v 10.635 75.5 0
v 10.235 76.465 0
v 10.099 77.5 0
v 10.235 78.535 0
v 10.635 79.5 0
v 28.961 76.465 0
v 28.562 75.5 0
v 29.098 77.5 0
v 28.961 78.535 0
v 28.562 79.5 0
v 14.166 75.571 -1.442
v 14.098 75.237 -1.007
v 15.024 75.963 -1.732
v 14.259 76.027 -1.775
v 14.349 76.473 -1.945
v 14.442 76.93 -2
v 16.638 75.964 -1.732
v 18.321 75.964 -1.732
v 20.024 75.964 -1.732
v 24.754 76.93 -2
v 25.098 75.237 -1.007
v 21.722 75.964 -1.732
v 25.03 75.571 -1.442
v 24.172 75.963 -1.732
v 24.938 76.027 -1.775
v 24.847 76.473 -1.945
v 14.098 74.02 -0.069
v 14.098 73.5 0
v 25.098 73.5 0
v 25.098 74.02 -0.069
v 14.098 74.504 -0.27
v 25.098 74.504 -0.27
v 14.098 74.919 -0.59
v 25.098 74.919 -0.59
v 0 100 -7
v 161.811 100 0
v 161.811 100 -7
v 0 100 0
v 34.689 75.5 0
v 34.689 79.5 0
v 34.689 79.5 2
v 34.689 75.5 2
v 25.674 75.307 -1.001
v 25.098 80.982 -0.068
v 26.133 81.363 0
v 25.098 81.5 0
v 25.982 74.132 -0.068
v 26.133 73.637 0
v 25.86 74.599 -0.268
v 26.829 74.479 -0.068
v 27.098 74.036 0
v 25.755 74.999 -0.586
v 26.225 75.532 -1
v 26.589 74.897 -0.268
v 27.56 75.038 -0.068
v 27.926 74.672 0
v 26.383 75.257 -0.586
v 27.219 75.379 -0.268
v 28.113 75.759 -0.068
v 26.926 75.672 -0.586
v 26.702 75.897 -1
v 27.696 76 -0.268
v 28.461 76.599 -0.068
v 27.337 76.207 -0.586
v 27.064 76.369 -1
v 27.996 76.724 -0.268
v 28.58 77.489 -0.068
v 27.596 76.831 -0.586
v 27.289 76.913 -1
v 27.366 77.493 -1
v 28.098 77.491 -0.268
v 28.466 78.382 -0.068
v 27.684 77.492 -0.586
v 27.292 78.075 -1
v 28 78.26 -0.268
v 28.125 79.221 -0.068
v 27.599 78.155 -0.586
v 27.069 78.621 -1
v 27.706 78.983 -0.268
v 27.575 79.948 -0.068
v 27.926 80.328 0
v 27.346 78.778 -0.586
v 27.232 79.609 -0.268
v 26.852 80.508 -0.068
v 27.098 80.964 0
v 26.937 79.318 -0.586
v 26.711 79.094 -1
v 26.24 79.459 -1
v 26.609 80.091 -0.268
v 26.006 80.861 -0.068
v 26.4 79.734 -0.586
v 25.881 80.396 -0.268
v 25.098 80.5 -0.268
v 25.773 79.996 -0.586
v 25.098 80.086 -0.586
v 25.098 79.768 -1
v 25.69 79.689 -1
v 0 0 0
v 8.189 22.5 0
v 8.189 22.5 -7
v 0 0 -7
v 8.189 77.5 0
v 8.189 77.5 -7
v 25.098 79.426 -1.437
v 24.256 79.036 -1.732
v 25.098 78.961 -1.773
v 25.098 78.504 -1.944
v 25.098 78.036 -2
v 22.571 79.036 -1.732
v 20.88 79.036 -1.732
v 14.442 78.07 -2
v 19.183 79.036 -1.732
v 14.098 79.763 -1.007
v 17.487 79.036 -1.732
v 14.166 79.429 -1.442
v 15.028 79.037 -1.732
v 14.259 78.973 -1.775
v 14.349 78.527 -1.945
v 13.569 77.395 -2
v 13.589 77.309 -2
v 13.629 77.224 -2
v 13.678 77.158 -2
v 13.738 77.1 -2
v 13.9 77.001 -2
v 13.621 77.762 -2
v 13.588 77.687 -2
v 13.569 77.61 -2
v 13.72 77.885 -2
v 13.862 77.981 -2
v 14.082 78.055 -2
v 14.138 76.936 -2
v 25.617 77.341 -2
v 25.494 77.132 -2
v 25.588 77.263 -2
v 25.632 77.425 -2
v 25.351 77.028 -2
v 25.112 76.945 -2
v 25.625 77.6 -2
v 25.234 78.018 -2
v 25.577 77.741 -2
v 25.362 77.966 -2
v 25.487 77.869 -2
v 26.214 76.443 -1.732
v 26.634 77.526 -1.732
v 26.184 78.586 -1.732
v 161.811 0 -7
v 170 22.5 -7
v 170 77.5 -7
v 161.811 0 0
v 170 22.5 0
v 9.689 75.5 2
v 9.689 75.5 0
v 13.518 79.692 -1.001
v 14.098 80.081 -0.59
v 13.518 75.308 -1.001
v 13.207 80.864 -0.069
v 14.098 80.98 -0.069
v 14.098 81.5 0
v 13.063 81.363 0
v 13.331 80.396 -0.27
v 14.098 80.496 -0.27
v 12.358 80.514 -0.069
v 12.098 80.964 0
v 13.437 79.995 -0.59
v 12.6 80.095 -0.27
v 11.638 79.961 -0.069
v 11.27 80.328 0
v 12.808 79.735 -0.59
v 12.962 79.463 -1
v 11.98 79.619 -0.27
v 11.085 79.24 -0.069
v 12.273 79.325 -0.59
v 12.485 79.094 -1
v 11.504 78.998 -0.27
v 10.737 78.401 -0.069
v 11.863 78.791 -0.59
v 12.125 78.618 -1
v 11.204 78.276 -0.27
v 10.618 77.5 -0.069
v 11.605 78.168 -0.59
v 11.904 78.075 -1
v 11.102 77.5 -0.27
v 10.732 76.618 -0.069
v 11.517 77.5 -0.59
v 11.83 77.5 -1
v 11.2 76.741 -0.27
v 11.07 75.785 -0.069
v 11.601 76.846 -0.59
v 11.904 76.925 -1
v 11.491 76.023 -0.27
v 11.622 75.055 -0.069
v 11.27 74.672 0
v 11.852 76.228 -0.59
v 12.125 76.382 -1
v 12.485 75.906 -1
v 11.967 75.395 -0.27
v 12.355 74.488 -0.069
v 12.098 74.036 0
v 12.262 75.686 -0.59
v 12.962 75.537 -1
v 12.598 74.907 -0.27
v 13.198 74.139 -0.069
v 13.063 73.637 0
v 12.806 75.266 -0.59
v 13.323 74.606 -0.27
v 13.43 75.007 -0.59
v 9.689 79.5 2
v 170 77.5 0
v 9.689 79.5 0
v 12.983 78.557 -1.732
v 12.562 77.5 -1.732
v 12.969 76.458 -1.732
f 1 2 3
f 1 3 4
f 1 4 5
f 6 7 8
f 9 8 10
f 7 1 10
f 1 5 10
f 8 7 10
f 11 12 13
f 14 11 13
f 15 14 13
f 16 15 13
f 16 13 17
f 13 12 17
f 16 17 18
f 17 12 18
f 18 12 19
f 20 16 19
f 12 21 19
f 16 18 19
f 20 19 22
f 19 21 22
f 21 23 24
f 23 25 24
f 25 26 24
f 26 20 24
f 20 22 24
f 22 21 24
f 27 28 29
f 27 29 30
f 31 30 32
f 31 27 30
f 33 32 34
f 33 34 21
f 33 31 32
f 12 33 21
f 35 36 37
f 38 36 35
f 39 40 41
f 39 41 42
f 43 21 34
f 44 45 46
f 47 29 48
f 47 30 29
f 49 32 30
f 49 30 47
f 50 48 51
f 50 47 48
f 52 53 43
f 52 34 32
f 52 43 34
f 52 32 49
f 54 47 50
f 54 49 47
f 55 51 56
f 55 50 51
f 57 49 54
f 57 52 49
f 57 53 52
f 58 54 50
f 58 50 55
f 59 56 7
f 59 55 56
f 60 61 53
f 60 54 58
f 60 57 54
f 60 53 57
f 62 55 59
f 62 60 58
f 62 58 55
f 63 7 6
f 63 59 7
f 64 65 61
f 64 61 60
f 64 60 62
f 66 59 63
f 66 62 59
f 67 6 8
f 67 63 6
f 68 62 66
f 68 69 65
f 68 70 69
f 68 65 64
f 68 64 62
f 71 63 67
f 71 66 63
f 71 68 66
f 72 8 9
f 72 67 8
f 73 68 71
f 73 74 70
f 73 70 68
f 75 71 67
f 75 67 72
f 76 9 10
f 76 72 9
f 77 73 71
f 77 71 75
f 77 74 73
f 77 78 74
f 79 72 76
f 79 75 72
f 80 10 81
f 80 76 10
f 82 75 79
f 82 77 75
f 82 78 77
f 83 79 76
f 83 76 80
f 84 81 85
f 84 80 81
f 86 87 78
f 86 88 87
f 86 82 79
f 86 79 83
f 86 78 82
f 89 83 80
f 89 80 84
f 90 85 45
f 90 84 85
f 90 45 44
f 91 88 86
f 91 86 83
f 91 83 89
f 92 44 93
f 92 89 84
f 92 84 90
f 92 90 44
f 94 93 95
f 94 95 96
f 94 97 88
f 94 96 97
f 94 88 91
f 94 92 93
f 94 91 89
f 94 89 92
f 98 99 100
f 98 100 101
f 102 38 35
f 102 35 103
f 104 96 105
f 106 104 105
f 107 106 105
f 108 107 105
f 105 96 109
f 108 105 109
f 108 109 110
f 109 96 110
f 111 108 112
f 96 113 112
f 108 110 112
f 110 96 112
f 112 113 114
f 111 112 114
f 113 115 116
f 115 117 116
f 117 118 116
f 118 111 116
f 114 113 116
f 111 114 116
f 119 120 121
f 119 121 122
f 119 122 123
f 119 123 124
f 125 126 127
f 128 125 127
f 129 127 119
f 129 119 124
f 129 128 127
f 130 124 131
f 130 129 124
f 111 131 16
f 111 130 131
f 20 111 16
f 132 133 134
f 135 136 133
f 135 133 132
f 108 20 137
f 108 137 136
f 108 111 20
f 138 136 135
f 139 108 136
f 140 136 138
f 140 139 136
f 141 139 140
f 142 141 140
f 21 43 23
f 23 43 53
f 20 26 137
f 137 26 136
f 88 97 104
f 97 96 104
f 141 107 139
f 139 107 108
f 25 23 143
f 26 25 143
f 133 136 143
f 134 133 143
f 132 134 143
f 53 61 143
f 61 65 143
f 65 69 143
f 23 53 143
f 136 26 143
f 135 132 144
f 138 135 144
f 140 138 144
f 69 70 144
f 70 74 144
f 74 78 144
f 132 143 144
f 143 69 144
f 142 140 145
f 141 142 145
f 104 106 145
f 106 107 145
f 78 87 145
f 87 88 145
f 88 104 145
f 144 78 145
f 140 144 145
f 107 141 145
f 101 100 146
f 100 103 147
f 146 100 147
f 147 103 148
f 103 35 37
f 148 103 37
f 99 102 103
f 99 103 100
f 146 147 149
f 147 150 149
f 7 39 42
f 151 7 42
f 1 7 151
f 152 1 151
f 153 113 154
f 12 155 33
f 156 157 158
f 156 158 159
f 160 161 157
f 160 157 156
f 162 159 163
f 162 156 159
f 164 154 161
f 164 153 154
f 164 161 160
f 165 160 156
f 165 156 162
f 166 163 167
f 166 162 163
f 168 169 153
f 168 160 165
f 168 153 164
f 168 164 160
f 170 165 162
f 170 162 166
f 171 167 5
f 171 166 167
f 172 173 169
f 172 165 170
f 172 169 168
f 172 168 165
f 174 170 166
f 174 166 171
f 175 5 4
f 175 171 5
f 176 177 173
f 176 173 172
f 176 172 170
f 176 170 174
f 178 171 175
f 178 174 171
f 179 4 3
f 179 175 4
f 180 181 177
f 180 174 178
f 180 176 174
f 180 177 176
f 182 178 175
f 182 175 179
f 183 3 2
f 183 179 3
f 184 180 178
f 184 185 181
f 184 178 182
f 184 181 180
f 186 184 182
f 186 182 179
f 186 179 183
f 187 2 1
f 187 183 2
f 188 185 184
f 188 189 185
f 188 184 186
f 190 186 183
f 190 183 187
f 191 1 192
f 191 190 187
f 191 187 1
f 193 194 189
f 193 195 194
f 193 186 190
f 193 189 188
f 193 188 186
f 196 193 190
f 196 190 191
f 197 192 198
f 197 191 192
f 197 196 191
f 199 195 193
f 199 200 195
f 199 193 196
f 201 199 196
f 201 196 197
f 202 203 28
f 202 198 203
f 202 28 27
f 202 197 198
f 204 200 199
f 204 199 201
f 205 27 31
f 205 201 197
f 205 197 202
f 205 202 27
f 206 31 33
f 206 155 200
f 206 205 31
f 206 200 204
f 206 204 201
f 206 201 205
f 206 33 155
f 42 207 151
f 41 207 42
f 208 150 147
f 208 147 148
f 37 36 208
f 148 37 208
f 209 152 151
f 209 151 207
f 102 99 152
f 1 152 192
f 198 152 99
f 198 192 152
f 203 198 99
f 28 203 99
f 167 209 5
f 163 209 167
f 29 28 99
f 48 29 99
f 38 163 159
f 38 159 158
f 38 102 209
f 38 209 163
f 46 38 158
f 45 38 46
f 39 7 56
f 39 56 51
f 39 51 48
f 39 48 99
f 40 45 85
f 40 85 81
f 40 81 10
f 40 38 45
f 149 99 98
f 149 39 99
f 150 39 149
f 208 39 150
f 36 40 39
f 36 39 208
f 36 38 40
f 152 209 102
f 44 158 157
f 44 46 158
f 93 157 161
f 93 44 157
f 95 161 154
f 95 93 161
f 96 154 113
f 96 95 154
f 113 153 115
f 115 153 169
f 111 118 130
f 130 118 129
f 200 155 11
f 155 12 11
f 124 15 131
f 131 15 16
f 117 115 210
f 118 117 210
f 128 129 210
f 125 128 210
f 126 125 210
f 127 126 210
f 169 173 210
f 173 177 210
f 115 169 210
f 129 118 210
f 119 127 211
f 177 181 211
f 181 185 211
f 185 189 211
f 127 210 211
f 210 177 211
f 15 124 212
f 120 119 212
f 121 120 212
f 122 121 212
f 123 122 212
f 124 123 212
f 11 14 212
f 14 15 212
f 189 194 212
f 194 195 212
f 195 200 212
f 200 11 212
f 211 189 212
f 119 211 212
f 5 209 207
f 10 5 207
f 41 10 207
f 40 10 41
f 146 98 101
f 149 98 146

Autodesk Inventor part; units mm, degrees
ref_plane "YZ Plane" through (0, 0, 0) normal (1, 0, 0) x (0, 1, 0)
ref_plane "XZ Plane" through (0, 0, 0) normal (0, 1, 0) x (-1, 0, 0)
ref_plane "XY Plane" through (0, 0, 0) normal (0, 0, 1) x (1, 0, 0)
sketch "Эскиз1" plane through (0, 0, 0) normal (0, 0, 1) x (1, 0, 0)
  line L0 (0, 0) -> (170, 0)
  line L1 (170, 0) -> (170, 100)
  line L2 (170, 100) -> (0, 100)
  line L3 (0, 100) -> (0, 0) construction
  line L4 (0, 100) -> (8.1893, 77.5)
  line L5 (8.1893, 77.5) -> (8.1893, 22.5)
  line L6 (8.1893, 22.5) -> (0, 0)
  line L7 (161.8107, 100) -> (170, 77.5)
  line L8 (170, 22.5) -> (161.8107, 0)
  dimension "d0" = 170
  dimension "d1" = 100
  dimension "d2" = 20
  dimension "d3" = 55
  dimension "d4" = 20
  dimension "d6" = 55
  dimension "d7" = 20
extrude "Выдавливание1" add sketch "Эскиз1" against normal blind 7 contours L6 L5 L4 L2 L7 L1 L8 L0
sketch "Эскиз2" plane through (0, 0, 0) normal (0, 0, 1) x (1, 0, 0)
  line L0 (14.0981, 75.5) -> (25.0981, 75.5)
  line L1 (27.0981, 77.5) -> (27.0981, 77.5)
  line L2 (25.0981, 79.5) -> (14.0981, 79.5)
  line L3 (12.0981, 77.5) -> (12.0981, 77.5)
  line L4 (12.0981, 75.5) -> (27.0981, 79.5) construction
  line L5 (27.0981, 75.5) -> (12.0981, 79.5) construction
  arc A0 (14.0981, 79.5) -> (12.0981, 77.5) centre (14.0981, 77.5) ccw
  arc A1 (12.0981, 77.5) -> (14.0981, 75.5) centre (14.0981, 77.5) ccw
  arc A2 (25.0981, 75.5) -> (27.0981, 77.5) centre (25.0981, 77.5) ccw
  arc A3 (27.0981, 77.5) -> (25.0981, 79.5) centre (25.0981, 77.5) ccw
  point P0 (0, 0)
  point P1 (19.5981, 77.5)
  dimension "d10" = 15
  dimension "d11" = 4
  dimension "d12" = 2
extrude "Выдавливание2" cut sketch "Эскиз2" against normal blind 2
fillet "Сопряжение1" radius 2 4 edges at (27.0981, 77.5, 0) (19.5981, 75.5, 0) (12.0981, 77.5, 0) (19.5981, 79.5, 0)
fillet "Сопряжение2" radius 2 8 edges at (19.5981, 79.5, -1.9995) (19.5981, 79.5, -2) (27.0981, 77.5, -1.9995) (27.0981, 77.5, -2) (19.5981, 75.5, -1.9995) (19.5981, 75.5, -2) (12.0981, 77.5, -1.9995) (12.0981, 77.5, -2)
sketch "Эскиз3" plane through (0, 0, 0) normal (0, 0, 1) x (1, 0, 0)
  line L0 (9.6893, 79.5) -> (34.6893, 79.5)
  line L1 (34.6893, 79.5) -> (34.6893, 75.5)
  line L2 (34.6893, 75.5) -> (9.6893, 75.5)
  line L3 (9.6893, 75.5) -> (9.6893, 79.5)
  line L4 (14.0981, 73.5) -> (25.0981, 73.5) projected
  line L5 (8.1893, 77.5) -> (8.1893, 22.5) projected
  point P0 (0, 0)
  dimension "d17" = 4
  dimension "d18" = 25
  dimension "d19" = 2
  dimension "d20" = 1.5
extrude "Выдавливание3" add sketch "Эскиз3" along normal blind 2
properties part number "ДИ 00.00.03"
